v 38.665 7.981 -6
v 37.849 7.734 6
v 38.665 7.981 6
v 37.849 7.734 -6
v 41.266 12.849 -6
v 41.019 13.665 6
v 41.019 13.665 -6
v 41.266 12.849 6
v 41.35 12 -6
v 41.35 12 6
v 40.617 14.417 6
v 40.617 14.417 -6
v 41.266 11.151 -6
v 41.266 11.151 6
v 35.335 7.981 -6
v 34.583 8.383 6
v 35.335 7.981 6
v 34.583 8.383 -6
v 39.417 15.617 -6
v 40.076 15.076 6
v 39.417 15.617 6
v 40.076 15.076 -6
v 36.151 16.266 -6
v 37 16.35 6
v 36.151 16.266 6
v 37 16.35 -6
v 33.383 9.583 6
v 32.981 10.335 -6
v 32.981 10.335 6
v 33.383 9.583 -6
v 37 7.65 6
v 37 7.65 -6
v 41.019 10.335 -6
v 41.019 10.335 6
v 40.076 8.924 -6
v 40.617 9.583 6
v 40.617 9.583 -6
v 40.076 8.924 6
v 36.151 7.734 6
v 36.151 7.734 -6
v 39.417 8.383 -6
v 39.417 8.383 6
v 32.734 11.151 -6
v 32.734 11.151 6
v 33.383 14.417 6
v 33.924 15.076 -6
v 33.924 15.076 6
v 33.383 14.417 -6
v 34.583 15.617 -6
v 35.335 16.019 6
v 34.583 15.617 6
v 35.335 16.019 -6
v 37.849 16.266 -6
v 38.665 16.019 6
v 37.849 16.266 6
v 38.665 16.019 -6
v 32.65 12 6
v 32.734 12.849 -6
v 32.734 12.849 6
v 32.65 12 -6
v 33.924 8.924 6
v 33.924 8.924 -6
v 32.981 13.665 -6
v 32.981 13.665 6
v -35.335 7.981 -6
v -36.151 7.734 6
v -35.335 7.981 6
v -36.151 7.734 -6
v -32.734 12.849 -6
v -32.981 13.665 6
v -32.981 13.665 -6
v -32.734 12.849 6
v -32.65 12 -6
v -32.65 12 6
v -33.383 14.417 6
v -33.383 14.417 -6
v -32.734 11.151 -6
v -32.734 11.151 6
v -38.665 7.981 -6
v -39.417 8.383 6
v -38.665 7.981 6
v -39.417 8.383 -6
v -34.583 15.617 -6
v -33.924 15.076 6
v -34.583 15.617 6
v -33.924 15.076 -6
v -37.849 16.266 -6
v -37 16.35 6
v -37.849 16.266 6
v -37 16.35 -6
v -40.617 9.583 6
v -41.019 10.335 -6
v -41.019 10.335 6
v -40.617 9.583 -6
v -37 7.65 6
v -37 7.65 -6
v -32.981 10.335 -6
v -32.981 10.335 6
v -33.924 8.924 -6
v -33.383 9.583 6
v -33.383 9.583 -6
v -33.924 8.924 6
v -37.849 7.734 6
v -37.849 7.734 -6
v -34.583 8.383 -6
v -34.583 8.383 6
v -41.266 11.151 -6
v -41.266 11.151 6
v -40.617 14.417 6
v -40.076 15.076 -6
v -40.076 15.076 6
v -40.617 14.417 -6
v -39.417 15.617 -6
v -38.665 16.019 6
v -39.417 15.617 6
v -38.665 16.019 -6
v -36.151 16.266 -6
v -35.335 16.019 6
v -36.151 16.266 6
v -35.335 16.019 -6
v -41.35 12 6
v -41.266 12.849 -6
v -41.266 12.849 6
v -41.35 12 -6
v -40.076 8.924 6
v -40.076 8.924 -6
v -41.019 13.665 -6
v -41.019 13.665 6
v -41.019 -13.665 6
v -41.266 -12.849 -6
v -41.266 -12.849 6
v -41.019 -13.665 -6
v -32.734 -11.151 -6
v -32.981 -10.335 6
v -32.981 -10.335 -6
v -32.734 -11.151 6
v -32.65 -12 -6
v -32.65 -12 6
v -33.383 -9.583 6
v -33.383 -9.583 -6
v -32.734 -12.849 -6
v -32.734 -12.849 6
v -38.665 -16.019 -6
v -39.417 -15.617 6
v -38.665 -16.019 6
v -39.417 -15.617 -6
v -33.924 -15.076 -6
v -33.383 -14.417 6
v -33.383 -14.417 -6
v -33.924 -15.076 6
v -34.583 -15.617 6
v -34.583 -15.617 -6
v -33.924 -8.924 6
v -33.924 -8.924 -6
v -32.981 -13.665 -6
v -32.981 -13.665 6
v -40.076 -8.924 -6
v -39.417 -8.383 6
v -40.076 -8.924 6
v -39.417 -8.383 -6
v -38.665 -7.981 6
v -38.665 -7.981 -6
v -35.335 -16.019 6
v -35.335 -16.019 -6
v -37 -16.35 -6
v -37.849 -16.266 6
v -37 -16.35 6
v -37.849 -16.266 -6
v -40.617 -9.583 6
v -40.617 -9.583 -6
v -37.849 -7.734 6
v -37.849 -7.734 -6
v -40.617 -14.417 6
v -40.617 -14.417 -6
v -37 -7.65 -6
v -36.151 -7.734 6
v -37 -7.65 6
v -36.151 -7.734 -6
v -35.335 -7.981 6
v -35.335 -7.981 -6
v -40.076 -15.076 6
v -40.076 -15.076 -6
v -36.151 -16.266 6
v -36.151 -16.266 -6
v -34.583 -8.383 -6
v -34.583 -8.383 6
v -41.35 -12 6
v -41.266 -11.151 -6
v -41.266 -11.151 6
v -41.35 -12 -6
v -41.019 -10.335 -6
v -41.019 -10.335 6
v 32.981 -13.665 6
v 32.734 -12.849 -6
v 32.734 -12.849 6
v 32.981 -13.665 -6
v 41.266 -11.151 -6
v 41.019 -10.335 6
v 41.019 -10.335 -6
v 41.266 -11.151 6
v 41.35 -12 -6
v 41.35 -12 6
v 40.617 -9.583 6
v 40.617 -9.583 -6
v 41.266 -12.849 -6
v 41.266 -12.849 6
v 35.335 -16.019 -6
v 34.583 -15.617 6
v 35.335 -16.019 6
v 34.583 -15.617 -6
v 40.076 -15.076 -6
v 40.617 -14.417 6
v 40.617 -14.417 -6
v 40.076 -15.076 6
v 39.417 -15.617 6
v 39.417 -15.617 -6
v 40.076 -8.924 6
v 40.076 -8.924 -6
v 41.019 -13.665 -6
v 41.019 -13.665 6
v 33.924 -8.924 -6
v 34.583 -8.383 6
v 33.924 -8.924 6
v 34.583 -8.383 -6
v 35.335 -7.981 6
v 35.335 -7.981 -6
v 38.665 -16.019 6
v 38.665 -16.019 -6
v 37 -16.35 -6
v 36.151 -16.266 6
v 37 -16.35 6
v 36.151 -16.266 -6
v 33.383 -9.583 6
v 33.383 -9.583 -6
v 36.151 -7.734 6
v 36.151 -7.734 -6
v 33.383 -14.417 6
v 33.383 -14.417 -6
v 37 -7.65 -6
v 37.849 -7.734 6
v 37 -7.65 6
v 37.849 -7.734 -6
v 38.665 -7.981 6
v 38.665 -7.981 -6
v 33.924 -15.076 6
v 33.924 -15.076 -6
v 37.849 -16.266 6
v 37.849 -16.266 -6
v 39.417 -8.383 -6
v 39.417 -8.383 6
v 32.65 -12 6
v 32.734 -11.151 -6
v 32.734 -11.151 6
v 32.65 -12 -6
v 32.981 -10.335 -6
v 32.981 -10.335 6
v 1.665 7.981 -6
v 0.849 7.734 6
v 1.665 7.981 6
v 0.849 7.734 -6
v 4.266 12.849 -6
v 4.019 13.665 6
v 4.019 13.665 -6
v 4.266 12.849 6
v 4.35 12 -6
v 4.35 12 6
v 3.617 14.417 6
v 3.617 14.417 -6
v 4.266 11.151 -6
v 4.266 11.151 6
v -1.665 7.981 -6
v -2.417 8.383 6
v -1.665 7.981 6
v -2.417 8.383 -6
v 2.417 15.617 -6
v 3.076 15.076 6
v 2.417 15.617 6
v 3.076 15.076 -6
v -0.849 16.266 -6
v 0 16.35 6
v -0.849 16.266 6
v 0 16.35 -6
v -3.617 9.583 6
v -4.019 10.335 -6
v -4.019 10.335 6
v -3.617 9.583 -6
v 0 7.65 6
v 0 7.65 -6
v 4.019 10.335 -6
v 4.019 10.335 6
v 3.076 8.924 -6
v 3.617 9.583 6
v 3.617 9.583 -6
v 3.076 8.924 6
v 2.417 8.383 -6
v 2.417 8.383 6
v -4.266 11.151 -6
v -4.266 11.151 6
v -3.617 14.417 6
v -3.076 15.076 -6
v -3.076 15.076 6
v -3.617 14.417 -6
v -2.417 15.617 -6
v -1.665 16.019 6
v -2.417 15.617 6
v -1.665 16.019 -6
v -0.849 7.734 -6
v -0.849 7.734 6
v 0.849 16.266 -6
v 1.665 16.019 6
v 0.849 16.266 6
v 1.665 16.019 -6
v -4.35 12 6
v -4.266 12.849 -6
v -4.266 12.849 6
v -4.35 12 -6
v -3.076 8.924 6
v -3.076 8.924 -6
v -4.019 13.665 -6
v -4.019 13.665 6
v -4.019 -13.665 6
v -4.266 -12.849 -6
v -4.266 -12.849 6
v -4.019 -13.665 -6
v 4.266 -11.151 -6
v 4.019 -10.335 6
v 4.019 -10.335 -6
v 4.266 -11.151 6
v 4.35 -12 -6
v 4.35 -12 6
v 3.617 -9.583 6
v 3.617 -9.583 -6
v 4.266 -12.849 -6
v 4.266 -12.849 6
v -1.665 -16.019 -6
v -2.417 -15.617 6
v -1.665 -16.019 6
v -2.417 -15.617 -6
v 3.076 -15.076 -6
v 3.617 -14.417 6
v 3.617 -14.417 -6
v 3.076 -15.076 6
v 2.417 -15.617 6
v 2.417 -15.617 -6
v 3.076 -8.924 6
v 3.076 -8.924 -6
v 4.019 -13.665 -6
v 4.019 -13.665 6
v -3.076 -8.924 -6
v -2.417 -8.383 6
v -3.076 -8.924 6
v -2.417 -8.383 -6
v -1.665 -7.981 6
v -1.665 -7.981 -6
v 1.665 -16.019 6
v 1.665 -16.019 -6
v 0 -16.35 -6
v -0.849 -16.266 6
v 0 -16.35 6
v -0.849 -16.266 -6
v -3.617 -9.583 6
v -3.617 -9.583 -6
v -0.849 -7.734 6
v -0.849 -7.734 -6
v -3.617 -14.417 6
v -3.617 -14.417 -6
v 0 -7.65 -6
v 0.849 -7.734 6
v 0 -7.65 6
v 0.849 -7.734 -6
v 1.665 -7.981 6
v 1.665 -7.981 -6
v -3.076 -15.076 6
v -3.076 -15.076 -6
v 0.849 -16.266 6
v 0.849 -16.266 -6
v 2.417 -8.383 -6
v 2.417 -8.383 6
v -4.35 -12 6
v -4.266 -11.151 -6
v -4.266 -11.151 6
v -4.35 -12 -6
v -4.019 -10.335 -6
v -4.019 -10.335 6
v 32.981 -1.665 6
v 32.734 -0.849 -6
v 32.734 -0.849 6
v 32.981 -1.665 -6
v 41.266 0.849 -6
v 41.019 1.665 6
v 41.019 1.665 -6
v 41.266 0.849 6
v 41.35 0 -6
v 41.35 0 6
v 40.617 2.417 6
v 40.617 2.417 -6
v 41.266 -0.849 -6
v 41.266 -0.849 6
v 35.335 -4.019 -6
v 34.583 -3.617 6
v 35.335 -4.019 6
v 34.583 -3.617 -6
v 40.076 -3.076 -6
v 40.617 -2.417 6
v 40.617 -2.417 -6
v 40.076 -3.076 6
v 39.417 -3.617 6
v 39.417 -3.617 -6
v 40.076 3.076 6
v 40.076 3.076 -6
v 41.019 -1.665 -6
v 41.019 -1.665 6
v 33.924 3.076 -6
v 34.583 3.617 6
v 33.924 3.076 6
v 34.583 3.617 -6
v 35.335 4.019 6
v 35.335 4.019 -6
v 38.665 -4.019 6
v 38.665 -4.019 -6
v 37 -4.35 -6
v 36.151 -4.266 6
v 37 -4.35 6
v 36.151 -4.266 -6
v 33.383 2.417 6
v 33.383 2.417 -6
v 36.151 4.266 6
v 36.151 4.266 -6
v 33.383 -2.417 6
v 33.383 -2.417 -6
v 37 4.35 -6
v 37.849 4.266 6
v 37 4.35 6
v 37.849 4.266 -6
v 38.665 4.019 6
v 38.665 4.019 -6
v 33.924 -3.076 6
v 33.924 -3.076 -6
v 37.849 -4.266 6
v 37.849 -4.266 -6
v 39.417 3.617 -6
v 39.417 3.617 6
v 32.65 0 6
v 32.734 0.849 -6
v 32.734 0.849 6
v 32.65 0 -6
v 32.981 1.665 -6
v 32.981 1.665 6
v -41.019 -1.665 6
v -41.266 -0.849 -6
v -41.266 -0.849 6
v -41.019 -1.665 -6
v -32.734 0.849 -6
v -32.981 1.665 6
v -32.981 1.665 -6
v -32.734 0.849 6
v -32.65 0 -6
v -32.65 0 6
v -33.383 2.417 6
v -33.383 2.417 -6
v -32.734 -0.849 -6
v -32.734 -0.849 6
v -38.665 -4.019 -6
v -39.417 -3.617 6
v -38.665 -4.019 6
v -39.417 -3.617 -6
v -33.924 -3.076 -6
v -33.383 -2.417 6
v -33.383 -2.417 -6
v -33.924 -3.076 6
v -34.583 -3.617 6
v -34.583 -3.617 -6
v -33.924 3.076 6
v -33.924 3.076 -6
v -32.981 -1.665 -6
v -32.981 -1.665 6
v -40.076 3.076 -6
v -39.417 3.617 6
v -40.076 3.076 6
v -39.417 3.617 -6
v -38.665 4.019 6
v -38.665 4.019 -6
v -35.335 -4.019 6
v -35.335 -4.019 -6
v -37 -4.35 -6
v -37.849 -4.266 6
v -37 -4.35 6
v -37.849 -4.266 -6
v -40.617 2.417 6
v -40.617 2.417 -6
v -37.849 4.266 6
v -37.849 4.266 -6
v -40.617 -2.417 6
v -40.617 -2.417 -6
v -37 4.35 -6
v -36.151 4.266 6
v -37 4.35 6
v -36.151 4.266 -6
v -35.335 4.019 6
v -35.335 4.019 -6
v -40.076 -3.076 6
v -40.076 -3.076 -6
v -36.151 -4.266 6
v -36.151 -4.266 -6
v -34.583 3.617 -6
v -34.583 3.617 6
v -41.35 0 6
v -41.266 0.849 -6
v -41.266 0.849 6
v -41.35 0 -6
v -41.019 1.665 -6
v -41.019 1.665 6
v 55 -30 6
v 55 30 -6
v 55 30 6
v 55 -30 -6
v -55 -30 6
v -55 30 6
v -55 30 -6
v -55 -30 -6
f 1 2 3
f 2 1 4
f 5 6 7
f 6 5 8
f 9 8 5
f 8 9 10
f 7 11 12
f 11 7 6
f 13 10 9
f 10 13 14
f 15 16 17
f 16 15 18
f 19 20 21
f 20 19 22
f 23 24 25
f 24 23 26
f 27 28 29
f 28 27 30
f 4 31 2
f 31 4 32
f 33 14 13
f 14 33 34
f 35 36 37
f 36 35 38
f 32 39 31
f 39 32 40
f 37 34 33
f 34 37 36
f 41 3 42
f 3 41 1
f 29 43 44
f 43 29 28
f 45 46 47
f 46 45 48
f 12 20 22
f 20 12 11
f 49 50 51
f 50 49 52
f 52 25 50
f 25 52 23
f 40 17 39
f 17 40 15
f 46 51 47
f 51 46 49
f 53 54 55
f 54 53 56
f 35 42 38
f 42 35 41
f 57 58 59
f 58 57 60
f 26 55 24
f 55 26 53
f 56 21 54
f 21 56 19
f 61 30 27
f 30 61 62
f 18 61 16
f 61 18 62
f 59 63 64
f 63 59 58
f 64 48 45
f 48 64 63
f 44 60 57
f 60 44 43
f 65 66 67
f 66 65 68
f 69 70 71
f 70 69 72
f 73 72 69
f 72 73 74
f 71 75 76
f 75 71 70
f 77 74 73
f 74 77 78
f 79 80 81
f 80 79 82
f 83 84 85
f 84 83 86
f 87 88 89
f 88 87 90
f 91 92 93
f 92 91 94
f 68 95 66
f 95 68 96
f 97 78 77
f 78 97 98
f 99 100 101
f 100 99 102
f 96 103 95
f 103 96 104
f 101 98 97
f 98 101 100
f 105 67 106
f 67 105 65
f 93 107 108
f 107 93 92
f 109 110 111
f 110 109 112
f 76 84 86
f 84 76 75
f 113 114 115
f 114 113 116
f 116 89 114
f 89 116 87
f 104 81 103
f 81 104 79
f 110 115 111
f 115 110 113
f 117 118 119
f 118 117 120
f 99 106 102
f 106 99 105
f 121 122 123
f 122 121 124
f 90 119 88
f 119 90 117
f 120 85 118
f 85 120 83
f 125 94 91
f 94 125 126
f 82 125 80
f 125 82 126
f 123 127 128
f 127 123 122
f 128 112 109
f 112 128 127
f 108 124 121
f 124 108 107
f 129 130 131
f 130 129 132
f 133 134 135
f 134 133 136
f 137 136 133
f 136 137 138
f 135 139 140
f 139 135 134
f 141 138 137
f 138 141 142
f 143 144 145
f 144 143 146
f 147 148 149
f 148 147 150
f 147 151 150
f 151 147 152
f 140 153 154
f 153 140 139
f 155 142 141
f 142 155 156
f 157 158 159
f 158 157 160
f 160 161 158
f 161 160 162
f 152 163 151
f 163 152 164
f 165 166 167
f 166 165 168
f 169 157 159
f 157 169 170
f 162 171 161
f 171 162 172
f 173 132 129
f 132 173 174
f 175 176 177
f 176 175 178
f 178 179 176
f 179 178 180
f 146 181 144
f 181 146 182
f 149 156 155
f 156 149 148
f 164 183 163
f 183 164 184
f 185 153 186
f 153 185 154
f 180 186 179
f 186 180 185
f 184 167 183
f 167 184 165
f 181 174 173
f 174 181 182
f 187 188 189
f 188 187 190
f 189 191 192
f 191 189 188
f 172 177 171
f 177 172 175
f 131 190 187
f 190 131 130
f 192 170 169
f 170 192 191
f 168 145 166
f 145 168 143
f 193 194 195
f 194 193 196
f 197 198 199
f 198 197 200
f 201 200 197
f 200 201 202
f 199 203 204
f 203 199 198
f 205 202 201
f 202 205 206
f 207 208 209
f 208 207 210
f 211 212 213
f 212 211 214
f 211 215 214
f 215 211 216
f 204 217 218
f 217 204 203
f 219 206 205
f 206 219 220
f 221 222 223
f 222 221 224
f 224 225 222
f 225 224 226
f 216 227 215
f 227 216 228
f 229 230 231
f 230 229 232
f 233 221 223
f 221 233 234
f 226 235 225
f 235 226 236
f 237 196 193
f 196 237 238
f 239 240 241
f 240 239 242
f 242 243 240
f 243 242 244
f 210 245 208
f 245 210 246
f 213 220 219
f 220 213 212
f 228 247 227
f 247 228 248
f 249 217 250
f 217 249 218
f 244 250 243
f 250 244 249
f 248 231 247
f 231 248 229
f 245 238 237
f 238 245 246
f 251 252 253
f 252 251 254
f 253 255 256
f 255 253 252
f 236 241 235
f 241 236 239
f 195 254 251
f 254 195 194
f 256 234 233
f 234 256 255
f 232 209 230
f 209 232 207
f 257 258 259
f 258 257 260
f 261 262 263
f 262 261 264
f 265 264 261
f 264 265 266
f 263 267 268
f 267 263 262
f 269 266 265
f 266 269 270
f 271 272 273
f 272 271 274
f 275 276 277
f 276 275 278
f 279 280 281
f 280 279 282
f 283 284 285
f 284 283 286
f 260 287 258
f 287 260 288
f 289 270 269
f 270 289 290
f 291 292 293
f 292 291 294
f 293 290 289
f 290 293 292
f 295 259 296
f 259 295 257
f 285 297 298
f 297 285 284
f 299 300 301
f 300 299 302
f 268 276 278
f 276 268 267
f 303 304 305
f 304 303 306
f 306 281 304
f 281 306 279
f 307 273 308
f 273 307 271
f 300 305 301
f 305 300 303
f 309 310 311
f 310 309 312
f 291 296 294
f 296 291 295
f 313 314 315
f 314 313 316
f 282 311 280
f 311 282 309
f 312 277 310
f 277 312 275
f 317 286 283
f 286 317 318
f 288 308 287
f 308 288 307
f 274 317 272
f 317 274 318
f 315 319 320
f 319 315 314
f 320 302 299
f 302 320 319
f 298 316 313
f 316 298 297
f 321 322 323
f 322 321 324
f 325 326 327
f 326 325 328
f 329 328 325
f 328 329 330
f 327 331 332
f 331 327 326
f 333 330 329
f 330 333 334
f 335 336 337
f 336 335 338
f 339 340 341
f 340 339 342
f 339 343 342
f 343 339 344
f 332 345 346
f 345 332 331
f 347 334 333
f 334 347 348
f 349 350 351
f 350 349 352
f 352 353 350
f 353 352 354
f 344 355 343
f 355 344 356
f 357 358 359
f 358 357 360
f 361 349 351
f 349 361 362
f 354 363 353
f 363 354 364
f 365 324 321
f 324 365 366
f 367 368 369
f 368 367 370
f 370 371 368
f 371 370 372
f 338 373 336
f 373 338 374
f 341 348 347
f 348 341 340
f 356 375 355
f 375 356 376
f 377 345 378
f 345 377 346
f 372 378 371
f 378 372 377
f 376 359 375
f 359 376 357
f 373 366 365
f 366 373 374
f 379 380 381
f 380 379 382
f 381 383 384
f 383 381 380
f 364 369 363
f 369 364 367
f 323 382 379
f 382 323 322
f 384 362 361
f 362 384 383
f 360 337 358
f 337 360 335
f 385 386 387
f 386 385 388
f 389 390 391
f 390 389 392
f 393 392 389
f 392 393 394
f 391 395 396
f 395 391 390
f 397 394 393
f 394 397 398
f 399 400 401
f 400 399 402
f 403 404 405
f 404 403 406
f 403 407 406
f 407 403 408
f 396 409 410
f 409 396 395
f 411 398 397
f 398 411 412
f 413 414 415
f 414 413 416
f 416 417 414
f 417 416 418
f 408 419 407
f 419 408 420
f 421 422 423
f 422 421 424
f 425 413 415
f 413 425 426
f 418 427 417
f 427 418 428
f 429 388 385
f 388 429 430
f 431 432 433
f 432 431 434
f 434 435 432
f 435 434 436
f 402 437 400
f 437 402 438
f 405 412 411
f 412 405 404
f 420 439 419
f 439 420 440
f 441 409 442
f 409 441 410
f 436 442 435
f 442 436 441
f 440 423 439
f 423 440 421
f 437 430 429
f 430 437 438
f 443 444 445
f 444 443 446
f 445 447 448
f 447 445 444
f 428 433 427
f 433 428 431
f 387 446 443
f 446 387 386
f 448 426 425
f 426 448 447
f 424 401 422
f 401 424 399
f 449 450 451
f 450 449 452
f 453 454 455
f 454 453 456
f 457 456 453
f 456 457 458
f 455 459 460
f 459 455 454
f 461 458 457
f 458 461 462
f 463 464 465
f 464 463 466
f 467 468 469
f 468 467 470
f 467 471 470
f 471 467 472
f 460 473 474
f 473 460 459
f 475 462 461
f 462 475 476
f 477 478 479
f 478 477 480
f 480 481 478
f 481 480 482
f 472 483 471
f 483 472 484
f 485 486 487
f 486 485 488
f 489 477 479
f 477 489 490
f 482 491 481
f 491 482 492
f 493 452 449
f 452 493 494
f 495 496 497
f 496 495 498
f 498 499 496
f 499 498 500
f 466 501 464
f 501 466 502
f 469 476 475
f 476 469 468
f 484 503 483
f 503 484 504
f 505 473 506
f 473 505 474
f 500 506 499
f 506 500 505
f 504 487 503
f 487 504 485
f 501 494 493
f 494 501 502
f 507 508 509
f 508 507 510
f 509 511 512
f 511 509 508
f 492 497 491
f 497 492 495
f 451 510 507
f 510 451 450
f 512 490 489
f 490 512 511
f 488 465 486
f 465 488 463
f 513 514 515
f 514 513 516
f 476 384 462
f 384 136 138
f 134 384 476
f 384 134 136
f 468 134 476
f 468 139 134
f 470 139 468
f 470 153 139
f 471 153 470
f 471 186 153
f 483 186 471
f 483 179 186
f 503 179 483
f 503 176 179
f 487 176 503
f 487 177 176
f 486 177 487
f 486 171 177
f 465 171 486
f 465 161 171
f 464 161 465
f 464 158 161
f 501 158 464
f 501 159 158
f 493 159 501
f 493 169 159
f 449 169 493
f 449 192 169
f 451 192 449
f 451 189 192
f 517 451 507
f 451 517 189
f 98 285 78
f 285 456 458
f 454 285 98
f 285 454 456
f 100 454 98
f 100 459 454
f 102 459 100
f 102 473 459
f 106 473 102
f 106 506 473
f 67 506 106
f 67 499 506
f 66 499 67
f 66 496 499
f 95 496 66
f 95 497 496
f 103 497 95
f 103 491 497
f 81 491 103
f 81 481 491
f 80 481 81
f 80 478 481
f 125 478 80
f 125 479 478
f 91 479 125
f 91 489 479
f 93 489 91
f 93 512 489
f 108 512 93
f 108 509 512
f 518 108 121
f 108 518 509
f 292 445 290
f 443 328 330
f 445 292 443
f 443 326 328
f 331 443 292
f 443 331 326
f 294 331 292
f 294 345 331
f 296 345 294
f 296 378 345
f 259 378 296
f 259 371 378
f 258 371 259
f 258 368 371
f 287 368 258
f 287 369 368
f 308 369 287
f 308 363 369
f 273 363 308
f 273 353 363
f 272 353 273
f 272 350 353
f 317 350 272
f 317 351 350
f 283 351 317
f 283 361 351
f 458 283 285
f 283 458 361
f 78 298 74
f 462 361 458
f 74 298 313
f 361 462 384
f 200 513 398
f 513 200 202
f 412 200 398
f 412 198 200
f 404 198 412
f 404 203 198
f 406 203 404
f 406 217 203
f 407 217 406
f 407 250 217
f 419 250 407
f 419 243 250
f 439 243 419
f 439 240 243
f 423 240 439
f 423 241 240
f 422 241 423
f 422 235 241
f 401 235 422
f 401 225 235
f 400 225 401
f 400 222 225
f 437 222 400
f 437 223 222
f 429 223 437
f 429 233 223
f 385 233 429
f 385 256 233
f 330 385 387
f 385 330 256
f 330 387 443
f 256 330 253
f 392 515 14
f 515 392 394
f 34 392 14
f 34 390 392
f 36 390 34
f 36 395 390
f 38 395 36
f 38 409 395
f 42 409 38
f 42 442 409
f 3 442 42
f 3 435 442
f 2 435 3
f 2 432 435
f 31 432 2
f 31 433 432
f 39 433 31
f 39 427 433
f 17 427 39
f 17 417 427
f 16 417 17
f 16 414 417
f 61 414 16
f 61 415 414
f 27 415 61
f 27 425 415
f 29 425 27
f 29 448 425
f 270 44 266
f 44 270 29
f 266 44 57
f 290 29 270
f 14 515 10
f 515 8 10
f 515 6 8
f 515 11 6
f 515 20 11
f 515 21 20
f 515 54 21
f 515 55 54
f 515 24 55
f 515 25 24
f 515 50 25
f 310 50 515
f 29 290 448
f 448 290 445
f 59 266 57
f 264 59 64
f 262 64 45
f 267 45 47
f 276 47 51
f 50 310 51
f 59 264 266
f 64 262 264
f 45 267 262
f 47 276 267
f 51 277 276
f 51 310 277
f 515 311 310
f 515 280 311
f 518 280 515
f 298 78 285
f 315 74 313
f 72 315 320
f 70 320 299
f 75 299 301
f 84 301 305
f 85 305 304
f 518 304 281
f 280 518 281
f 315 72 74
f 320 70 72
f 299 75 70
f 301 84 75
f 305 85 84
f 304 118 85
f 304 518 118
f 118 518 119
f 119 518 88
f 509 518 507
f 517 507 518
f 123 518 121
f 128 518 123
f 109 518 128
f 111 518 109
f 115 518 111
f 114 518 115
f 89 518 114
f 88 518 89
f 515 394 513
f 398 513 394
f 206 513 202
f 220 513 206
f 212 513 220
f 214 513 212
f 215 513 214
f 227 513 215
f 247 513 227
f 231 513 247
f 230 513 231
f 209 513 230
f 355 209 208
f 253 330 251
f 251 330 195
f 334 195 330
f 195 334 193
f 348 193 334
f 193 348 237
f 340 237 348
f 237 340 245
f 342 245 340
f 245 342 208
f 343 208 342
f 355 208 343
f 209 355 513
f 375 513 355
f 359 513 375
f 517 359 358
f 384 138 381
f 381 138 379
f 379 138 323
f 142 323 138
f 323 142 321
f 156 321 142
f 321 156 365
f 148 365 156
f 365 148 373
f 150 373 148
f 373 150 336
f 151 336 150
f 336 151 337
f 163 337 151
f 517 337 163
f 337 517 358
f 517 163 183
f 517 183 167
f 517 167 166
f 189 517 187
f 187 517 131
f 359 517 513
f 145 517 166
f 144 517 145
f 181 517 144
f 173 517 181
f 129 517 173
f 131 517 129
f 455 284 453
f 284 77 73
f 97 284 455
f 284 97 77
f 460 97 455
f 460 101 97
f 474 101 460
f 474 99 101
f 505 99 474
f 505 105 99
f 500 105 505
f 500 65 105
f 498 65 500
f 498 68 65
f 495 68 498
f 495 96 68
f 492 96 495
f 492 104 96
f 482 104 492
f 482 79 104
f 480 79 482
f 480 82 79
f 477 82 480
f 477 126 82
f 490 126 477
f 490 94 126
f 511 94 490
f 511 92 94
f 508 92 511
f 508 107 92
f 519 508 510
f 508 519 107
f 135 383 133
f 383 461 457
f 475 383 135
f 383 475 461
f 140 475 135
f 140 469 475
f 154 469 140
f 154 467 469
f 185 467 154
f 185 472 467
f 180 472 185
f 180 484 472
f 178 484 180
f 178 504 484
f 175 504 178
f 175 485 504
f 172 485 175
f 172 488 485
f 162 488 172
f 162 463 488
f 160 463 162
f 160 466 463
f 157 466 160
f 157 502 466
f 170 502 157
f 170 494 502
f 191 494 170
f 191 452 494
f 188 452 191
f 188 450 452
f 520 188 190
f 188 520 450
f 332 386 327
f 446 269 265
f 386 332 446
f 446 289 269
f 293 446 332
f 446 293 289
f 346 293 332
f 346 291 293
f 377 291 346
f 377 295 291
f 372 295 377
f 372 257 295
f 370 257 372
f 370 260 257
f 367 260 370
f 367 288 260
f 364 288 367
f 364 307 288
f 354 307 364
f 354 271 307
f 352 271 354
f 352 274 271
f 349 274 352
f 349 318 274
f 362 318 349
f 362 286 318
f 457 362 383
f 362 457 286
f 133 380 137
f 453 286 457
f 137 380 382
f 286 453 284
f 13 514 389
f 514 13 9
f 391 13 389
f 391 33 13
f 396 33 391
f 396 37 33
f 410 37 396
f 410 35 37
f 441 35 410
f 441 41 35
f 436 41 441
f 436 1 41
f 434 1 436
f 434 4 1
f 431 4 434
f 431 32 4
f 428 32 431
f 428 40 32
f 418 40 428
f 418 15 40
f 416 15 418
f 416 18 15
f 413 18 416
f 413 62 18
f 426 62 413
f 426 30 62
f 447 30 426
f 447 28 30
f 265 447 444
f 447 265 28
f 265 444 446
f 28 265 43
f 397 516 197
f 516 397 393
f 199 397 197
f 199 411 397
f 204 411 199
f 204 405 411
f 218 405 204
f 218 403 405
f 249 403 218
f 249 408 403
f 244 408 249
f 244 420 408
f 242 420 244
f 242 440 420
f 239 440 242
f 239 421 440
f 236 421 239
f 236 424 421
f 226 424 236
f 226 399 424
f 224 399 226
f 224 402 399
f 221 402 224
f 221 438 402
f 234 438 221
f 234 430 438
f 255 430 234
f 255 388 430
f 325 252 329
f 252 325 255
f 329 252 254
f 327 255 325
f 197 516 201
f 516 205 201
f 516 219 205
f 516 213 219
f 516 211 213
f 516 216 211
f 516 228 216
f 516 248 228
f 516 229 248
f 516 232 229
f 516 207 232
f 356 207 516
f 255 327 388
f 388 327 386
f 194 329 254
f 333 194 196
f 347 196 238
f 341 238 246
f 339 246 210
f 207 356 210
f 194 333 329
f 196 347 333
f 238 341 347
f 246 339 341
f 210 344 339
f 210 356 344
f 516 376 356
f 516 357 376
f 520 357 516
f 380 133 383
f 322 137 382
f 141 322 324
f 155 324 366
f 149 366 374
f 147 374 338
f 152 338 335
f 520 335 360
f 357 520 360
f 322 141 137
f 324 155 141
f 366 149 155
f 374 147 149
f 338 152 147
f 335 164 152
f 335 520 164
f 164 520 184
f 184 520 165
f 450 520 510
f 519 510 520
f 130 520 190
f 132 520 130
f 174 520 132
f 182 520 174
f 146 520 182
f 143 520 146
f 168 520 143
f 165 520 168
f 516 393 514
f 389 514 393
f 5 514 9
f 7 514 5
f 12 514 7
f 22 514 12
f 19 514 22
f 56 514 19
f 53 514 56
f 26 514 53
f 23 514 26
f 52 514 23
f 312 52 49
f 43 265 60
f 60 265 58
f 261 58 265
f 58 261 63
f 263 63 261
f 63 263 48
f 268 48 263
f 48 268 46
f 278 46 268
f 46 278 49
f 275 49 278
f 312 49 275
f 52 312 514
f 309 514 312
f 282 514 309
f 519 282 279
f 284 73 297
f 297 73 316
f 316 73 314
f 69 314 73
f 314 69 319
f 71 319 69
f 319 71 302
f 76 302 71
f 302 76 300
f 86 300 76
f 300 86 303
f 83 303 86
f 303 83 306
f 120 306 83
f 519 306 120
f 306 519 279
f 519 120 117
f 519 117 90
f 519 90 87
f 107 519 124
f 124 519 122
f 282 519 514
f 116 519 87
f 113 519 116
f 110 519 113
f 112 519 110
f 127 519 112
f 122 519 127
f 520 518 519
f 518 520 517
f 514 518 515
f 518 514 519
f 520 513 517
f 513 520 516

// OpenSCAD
$fn = 32;

// ----------------------------------------------------------------------
// Corner plate 110 x 60 x 12
// 8 holes, centres taken from the edge offset
// ----------------------------------------------------------------------

// --- parameters (mm) ---
plate = [110, 60, 12];  // overall size (x, y, z)
holes = 8;              // number of holes the drawing asks for
bore_d = 8.4;           // nominal hole diameter from the drawing
print_allowance = 0.3;  // clearance added for printing
edge = 18;              // hole centre offset from the plate edge

// --- derived feature positions (mm) ---
hole_d = bore_d + print_allowance;  // = 8.7   hole diameter as printed
corner_x = plate[0] / 2 - edge;     // = 37   corner hole X
corner_y = plate[1] / 2 - edge;     // = 12   corner hole Y
feature_centers = [
  [corner_x, corner_y],
  [-corner_x, corner_y],
  [-corner_x, -corner_y],
  [corner_x, -corner_y],
  [0, corner_y],
  [0, -corner_y],
  [corner_x, 0],
  [-corner_x, 0]
];   // hole centres the loop below drills

// plate outline, every hole drilled through with the same cutters
difference() {
  cube(plate, center = true);
  for (centre = feature_centers)
    translate([centre[0], centre[1], 0])
      cylinder(d = hole_d, h = plate[2] + 2, center = true);
}
